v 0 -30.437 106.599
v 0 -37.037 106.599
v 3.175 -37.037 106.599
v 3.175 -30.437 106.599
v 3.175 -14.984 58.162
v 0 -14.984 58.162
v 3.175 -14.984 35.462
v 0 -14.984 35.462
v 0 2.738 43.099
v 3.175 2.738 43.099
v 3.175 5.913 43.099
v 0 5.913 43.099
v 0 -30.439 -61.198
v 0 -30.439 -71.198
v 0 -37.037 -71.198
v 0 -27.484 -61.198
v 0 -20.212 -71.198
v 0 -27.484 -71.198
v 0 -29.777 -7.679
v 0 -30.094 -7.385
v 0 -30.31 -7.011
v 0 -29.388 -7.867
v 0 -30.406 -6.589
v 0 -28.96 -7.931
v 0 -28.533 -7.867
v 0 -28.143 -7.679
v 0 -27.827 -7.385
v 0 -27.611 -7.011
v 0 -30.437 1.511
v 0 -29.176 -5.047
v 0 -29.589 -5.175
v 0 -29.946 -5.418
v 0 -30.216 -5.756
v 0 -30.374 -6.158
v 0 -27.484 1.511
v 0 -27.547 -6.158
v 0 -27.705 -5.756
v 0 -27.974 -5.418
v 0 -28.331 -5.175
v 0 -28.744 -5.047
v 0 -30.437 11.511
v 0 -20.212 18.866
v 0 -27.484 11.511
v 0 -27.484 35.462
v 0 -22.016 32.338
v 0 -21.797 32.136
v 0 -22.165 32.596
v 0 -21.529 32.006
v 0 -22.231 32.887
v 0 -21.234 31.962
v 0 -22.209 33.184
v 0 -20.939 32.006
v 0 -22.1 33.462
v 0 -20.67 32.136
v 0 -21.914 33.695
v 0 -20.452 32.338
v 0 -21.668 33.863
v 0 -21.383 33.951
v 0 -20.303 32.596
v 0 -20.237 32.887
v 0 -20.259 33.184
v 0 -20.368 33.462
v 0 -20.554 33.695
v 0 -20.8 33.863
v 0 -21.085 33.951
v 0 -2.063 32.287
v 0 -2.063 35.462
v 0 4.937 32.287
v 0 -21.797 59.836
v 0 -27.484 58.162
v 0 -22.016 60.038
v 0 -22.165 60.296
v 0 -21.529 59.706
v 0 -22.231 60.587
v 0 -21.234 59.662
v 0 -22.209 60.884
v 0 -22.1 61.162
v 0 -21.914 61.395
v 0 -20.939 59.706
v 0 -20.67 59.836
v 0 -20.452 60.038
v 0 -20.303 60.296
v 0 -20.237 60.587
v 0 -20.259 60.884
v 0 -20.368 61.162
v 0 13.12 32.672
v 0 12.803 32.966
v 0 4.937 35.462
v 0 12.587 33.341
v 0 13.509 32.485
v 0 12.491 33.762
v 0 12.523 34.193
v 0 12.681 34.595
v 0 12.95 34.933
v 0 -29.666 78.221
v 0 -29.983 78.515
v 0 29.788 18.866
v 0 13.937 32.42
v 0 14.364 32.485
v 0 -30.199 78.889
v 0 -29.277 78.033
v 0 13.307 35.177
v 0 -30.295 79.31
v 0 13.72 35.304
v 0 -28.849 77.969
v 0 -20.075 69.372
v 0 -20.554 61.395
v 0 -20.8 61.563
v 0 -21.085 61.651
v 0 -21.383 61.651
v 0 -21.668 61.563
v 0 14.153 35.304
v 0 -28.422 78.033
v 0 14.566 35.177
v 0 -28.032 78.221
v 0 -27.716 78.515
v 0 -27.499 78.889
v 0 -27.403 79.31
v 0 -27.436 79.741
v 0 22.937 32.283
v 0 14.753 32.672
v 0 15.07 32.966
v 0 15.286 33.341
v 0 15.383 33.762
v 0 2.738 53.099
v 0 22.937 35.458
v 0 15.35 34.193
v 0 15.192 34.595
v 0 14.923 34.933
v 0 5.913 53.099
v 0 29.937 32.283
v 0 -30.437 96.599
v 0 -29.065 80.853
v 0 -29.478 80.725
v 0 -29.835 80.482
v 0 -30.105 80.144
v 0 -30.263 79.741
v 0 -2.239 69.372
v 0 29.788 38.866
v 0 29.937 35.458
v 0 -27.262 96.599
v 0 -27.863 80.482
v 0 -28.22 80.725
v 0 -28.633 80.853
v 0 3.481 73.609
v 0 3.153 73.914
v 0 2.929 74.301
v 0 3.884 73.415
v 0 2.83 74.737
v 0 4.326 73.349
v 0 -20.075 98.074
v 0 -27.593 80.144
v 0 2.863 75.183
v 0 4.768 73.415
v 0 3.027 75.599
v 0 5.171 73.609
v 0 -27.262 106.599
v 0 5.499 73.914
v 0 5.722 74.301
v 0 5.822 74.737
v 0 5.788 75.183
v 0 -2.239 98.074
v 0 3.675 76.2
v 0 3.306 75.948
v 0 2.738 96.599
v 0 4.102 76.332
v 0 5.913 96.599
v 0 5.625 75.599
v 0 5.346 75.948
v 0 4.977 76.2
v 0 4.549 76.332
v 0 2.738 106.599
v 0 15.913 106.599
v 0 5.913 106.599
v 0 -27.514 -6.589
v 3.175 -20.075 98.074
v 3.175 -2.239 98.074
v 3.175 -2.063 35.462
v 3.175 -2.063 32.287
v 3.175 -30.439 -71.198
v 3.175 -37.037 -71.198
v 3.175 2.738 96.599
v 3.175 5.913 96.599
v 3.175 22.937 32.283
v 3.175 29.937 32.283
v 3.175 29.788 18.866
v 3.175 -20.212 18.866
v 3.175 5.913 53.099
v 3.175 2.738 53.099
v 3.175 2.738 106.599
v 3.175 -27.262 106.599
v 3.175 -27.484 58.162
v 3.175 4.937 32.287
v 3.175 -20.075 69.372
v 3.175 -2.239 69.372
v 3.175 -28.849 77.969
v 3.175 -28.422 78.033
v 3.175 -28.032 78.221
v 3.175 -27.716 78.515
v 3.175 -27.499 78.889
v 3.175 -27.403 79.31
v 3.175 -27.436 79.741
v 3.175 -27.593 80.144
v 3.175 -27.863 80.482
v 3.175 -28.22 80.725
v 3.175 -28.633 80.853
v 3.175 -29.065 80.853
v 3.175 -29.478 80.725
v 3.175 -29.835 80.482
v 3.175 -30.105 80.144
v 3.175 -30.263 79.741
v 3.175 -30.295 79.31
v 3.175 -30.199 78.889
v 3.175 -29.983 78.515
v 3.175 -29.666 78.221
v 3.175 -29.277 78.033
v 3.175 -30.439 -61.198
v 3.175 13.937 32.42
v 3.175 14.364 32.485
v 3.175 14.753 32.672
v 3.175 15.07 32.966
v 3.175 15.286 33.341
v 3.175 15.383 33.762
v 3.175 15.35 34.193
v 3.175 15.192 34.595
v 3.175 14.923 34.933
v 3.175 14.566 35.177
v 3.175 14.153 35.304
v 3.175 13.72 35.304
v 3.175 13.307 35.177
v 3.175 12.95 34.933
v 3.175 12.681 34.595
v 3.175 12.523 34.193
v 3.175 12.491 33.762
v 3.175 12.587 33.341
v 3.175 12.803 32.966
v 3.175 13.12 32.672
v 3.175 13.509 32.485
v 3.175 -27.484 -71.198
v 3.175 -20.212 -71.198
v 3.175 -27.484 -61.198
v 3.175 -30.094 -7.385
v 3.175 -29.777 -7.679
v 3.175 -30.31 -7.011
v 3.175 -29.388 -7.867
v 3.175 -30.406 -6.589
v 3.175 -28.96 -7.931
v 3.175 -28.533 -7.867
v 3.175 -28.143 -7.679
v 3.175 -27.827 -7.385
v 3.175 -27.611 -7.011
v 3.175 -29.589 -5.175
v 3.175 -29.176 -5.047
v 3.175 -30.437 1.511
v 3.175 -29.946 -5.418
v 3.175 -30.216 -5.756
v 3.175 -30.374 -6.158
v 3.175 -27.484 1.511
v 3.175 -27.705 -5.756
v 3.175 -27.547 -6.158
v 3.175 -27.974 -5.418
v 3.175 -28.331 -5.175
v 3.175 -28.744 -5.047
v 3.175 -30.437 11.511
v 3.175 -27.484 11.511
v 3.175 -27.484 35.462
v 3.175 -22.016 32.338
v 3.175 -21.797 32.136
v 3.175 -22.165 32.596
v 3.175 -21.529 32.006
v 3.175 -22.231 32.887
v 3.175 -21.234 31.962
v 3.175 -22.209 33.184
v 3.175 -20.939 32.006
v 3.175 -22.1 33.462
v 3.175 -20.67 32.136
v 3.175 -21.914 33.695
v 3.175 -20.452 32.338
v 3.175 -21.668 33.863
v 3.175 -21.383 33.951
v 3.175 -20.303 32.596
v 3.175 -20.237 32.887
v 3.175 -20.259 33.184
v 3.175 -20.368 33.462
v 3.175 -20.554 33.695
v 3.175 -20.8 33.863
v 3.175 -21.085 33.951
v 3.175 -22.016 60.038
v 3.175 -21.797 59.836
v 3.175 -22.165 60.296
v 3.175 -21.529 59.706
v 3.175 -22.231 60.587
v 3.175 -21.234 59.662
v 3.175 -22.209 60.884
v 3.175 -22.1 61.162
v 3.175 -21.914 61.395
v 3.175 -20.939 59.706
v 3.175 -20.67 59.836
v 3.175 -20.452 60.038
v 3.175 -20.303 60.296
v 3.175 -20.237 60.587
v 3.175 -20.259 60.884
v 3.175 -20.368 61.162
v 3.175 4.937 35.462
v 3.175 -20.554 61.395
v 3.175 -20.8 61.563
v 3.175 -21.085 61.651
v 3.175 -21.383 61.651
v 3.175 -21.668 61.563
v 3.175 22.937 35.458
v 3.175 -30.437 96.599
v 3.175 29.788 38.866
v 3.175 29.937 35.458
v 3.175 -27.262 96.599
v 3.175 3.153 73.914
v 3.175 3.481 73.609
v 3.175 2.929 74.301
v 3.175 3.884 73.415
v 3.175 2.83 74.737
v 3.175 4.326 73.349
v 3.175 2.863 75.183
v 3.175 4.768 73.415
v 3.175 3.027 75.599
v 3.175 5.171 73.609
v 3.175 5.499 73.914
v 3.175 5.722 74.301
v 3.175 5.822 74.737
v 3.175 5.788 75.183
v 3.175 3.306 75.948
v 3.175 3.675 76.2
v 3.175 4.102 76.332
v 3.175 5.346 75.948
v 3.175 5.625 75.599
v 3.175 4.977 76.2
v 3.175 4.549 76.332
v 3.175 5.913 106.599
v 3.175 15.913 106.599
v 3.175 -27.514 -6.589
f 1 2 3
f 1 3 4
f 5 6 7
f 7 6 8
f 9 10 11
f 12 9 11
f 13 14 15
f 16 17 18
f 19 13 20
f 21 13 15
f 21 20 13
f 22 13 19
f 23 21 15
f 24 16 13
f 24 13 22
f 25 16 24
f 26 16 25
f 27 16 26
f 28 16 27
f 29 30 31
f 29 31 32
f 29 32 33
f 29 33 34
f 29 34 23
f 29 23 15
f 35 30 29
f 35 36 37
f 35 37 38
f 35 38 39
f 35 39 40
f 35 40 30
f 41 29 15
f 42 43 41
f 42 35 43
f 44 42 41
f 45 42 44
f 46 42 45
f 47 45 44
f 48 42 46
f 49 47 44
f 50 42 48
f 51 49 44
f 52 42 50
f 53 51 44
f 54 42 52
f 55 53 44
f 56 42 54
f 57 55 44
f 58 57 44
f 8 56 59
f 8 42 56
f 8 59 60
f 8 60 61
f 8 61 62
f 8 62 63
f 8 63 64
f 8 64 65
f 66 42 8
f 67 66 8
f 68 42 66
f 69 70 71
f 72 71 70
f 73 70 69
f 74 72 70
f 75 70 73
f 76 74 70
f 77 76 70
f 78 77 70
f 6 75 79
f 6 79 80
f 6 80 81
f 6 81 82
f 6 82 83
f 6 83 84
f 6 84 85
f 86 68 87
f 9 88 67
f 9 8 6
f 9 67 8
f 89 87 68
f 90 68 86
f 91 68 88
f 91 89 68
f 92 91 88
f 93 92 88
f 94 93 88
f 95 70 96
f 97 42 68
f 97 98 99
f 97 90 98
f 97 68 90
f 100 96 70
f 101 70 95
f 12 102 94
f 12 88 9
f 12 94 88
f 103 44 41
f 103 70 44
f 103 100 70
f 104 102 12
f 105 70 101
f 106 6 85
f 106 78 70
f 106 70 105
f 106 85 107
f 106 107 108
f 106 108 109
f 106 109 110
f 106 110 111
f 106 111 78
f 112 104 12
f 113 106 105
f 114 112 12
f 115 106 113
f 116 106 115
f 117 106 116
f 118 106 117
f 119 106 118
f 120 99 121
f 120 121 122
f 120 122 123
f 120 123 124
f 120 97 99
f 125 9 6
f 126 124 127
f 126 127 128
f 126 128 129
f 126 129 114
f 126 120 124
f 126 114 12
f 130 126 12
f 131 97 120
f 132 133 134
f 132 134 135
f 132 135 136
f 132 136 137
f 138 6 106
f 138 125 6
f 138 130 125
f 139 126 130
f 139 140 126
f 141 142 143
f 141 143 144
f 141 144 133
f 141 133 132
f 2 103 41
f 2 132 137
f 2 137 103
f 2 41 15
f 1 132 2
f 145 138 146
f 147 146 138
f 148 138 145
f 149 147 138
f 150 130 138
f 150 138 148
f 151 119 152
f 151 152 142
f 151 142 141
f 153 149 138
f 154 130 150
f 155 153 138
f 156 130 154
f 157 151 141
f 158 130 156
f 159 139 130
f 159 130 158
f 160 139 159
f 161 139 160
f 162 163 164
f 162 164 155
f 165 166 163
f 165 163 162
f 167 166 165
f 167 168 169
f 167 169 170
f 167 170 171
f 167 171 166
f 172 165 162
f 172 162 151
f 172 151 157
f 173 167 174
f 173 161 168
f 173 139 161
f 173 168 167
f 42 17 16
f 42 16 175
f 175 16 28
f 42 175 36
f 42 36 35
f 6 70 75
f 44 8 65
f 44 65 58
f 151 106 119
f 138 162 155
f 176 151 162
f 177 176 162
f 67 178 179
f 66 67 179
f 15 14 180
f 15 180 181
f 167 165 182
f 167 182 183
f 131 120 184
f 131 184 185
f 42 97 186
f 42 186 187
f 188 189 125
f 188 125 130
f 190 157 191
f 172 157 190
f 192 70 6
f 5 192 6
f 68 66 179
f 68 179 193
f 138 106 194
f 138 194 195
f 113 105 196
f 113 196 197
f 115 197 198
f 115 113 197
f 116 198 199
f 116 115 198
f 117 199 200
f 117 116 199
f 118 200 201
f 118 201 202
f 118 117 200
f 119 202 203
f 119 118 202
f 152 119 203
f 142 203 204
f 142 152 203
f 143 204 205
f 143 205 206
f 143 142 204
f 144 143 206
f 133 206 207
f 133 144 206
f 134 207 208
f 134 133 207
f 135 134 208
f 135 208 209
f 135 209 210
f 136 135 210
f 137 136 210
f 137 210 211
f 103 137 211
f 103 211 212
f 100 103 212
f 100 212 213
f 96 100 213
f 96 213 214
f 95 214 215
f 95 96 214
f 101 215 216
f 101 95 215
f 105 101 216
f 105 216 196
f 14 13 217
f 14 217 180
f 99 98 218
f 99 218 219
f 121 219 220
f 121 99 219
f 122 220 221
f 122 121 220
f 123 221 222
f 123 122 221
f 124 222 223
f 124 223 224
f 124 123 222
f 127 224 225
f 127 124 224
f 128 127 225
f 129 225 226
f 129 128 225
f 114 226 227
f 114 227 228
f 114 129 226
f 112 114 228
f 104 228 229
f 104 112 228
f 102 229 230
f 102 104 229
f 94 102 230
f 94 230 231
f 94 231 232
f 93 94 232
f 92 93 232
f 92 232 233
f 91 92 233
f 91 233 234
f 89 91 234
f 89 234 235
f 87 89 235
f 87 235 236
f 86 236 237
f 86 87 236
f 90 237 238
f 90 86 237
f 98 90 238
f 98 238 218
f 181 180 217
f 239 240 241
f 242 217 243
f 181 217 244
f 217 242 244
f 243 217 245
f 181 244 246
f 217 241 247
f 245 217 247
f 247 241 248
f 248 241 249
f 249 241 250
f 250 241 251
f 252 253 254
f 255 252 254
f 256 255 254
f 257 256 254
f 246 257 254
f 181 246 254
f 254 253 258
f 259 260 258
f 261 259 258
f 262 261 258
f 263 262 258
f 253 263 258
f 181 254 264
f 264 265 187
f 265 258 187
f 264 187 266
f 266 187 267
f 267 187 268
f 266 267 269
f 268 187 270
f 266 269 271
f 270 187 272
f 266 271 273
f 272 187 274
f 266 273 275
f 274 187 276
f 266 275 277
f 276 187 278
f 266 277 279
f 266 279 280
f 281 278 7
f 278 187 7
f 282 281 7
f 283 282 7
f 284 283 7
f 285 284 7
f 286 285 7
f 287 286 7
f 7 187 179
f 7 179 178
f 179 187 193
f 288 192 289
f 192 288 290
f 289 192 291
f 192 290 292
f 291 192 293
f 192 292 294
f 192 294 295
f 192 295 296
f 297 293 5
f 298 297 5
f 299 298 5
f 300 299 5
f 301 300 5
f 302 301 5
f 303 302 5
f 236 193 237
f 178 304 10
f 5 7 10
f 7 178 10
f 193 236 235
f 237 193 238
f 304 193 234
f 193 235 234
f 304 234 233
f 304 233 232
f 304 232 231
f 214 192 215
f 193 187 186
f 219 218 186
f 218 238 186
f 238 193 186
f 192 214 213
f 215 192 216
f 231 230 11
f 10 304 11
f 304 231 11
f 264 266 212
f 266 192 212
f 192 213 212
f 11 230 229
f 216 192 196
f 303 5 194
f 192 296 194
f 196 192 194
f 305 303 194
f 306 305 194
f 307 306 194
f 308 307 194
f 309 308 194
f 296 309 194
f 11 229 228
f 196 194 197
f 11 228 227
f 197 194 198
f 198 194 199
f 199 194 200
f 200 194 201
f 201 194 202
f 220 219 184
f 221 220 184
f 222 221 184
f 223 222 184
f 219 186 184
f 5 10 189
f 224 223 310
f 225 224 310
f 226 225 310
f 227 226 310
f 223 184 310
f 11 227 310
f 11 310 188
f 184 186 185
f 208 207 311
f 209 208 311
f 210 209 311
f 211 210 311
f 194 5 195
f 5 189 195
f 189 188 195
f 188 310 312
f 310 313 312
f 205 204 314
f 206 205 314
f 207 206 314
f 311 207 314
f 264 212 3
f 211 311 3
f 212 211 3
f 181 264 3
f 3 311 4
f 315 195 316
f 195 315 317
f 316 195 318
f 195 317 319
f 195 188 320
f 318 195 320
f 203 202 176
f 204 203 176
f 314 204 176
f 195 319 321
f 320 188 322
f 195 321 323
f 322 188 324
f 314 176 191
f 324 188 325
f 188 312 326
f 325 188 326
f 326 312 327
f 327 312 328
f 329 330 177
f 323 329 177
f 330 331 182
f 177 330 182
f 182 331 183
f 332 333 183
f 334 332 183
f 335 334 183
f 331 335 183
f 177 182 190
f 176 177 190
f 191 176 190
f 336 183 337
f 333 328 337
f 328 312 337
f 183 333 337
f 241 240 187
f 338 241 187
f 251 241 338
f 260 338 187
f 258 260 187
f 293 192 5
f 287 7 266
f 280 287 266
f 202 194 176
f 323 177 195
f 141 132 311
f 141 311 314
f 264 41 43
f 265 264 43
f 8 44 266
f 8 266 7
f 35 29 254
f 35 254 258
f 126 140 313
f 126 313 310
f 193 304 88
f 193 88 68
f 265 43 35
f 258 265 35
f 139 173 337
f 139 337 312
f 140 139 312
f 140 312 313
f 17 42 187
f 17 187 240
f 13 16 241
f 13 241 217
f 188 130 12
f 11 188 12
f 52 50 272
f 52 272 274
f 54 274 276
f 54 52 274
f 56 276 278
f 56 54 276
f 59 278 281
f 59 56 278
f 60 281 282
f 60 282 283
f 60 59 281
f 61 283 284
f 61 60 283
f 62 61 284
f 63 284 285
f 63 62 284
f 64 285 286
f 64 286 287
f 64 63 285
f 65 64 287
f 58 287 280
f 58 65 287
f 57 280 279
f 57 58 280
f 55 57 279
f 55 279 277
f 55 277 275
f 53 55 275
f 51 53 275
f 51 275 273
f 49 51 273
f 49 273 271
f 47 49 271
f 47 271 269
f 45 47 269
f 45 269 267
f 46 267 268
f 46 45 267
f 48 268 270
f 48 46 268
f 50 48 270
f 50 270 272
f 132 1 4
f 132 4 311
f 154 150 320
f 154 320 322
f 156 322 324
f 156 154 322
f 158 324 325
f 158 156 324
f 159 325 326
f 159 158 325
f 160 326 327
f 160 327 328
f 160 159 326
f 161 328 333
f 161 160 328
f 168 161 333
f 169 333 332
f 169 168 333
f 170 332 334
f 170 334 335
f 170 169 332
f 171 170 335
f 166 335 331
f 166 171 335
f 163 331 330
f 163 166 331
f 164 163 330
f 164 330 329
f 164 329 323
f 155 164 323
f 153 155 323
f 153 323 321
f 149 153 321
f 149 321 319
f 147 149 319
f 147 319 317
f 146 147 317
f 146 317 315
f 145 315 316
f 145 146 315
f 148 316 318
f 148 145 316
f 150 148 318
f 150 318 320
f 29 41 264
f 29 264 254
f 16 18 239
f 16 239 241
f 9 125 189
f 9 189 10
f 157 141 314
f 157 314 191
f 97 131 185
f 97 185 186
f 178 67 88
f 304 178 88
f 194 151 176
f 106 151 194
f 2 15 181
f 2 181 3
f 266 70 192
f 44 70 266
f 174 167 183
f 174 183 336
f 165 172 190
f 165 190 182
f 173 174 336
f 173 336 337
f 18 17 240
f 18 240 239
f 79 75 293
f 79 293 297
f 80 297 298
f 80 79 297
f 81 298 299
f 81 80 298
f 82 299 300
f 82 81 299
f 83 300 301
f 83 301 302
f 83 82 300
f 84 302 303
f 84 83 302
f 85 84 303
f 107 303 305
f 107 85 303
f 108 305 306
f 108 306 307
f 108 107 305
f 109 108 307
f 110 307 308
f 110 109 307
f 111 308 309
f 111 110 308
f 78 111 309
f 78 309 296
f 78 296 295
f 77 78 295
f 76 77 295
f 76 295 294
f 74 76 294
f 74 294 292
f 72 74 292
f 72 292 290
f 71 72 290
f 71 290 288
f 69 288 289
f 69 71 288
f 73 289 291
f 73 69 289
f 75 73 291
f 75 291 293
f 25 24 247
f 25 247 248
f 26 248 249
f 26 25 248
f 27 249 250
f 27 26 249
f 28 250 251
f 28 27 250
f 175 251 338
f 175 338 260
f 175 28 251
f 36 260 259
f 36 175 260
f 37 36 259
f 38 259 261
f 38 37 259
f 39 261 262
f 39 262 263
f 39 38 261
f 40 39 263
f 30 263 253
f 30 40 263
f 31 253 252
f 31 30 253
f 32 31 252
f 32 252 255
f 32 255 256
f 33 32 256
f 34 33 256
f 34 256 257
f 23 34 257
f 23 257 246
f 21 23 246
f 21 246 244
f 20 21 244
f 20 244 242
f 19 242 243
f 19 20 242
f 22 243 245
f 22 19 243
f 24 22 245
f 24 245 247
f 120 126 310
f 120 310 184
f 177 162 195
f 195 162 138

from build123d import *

# Parameters (mm, degrees)
SKETCH1_R      = 1.45
SKETCH1_R_2    = 1.44992108
SKETCH1_R_3    = 1
SKETCH1_R_4    = 1.5
SKETCH1_W      = 22.7
SKETCH1_H      = 12.5
SKETCH1_W_2    = 10
SKETCH1_H_2    = 2.952902408
SKETCH1_H_3    = 3.175
SKETCH1_W_3    = 3.175
SKETCH1_H_4    = 7
SKETCH1_W_4    = 28.701572838
SKETCH1_H_5    = 17.835977406
EXTRUDE1_DEPTH = 3.175


with BuildPart() as part:
    # Sketch1 → Extrude1 (new body)
    with BuildSketch(Plane(origin=(0, 0, 0), x_dir=(0, 0, -1), z_dir=(1, 0, 0))):
        Polygon((71.197724246, -30.438774567), (71.197724246, -37.036692127), (-106.598842421, -37.036692127), (-106.598842421, -30.436692127), (-96.598842421, -30.436692127), (-96.598842421, -27.261692127), (-106.598842421, -27.261692127), (-106.598842421, 2.738307873), (-96.598842421, 2.738307873), (-96.598842421, 5.913307873), (-106.598842421, 5.913307873), (-106.598842421, 15.913307873), (-38.865609087, 29.788307873), (-35.457953974, 29.936573589), (-35.457953974, 22.936573589), (-32.282953974, 22.936573589), (-32.282953974, 29.936573589), (-18.865609087, 29.788307873), (-18.865609087, -20.211692127), (71.197724246, -20.211692127), (71.197724246, -27.483789719), (61.197724246, -27.483789719), (61.197724246, -30.438774567), align=None)
        with Locations((-79.418842421, -28.849192127)):
            Circle(SKETCH1_R, mode=Mode.SUBTRACT)
        with Locations((6.481057579, -28.960240923)):
            Circle(SKETCH1_R_2, mode=Mode.SUBTRACT)
        with Locations((-60.661798953, -21.233789719)):
            Circle(SKETCH1_R_3, mode=Mode.SUBTRACT)
        with Locations((-32.961798953, -21.233789719)):
            Circle(SKETCH1_R_3, mode=Mode.SUBTRACT)
        with Locations((-33.870453974, 13.93657382)):
            Circle(SKETCH1_R, mode=Mode.SUBTRACT)
        with Locations((-74.848842421, 4.325807873)):
            Circle(SKETCH1_R_4, mode=Mode.SUBTRACT)
        with Locations((-46.811798953, -21.233789719)):
            Rectangle(SKETCH1_W, SKETCH1_H, mode=Mode.SUBTRACT)
        with Locations((-6.510665386, -28.960240923)):
            Rectangle(SKETCH1_W_2, SKETCH1_H_2, mode=Mode.SUBTRACT)
        with Locations((-48.098842421, 4.325807873)):
            Rectangle(SKETCH1_W_2, SKETCH1_H_3, mode=Mode.SUBTRACT)
        with Locations((-33.874298953, 1.43657382)):
            Rectangle(SKETCH1_W_3, SKETCH1_H_4, mode=Mode.SUBTRACT)
        with Locations((-83.72320649, -11.157017929)):
            Rectangle(SKETCH1_W_4, SKETCH1_H_5, mode=Mode.SUBTRACT)
    extrude(amount=EXTRUDE1_DEPTH)


solid = part.part
